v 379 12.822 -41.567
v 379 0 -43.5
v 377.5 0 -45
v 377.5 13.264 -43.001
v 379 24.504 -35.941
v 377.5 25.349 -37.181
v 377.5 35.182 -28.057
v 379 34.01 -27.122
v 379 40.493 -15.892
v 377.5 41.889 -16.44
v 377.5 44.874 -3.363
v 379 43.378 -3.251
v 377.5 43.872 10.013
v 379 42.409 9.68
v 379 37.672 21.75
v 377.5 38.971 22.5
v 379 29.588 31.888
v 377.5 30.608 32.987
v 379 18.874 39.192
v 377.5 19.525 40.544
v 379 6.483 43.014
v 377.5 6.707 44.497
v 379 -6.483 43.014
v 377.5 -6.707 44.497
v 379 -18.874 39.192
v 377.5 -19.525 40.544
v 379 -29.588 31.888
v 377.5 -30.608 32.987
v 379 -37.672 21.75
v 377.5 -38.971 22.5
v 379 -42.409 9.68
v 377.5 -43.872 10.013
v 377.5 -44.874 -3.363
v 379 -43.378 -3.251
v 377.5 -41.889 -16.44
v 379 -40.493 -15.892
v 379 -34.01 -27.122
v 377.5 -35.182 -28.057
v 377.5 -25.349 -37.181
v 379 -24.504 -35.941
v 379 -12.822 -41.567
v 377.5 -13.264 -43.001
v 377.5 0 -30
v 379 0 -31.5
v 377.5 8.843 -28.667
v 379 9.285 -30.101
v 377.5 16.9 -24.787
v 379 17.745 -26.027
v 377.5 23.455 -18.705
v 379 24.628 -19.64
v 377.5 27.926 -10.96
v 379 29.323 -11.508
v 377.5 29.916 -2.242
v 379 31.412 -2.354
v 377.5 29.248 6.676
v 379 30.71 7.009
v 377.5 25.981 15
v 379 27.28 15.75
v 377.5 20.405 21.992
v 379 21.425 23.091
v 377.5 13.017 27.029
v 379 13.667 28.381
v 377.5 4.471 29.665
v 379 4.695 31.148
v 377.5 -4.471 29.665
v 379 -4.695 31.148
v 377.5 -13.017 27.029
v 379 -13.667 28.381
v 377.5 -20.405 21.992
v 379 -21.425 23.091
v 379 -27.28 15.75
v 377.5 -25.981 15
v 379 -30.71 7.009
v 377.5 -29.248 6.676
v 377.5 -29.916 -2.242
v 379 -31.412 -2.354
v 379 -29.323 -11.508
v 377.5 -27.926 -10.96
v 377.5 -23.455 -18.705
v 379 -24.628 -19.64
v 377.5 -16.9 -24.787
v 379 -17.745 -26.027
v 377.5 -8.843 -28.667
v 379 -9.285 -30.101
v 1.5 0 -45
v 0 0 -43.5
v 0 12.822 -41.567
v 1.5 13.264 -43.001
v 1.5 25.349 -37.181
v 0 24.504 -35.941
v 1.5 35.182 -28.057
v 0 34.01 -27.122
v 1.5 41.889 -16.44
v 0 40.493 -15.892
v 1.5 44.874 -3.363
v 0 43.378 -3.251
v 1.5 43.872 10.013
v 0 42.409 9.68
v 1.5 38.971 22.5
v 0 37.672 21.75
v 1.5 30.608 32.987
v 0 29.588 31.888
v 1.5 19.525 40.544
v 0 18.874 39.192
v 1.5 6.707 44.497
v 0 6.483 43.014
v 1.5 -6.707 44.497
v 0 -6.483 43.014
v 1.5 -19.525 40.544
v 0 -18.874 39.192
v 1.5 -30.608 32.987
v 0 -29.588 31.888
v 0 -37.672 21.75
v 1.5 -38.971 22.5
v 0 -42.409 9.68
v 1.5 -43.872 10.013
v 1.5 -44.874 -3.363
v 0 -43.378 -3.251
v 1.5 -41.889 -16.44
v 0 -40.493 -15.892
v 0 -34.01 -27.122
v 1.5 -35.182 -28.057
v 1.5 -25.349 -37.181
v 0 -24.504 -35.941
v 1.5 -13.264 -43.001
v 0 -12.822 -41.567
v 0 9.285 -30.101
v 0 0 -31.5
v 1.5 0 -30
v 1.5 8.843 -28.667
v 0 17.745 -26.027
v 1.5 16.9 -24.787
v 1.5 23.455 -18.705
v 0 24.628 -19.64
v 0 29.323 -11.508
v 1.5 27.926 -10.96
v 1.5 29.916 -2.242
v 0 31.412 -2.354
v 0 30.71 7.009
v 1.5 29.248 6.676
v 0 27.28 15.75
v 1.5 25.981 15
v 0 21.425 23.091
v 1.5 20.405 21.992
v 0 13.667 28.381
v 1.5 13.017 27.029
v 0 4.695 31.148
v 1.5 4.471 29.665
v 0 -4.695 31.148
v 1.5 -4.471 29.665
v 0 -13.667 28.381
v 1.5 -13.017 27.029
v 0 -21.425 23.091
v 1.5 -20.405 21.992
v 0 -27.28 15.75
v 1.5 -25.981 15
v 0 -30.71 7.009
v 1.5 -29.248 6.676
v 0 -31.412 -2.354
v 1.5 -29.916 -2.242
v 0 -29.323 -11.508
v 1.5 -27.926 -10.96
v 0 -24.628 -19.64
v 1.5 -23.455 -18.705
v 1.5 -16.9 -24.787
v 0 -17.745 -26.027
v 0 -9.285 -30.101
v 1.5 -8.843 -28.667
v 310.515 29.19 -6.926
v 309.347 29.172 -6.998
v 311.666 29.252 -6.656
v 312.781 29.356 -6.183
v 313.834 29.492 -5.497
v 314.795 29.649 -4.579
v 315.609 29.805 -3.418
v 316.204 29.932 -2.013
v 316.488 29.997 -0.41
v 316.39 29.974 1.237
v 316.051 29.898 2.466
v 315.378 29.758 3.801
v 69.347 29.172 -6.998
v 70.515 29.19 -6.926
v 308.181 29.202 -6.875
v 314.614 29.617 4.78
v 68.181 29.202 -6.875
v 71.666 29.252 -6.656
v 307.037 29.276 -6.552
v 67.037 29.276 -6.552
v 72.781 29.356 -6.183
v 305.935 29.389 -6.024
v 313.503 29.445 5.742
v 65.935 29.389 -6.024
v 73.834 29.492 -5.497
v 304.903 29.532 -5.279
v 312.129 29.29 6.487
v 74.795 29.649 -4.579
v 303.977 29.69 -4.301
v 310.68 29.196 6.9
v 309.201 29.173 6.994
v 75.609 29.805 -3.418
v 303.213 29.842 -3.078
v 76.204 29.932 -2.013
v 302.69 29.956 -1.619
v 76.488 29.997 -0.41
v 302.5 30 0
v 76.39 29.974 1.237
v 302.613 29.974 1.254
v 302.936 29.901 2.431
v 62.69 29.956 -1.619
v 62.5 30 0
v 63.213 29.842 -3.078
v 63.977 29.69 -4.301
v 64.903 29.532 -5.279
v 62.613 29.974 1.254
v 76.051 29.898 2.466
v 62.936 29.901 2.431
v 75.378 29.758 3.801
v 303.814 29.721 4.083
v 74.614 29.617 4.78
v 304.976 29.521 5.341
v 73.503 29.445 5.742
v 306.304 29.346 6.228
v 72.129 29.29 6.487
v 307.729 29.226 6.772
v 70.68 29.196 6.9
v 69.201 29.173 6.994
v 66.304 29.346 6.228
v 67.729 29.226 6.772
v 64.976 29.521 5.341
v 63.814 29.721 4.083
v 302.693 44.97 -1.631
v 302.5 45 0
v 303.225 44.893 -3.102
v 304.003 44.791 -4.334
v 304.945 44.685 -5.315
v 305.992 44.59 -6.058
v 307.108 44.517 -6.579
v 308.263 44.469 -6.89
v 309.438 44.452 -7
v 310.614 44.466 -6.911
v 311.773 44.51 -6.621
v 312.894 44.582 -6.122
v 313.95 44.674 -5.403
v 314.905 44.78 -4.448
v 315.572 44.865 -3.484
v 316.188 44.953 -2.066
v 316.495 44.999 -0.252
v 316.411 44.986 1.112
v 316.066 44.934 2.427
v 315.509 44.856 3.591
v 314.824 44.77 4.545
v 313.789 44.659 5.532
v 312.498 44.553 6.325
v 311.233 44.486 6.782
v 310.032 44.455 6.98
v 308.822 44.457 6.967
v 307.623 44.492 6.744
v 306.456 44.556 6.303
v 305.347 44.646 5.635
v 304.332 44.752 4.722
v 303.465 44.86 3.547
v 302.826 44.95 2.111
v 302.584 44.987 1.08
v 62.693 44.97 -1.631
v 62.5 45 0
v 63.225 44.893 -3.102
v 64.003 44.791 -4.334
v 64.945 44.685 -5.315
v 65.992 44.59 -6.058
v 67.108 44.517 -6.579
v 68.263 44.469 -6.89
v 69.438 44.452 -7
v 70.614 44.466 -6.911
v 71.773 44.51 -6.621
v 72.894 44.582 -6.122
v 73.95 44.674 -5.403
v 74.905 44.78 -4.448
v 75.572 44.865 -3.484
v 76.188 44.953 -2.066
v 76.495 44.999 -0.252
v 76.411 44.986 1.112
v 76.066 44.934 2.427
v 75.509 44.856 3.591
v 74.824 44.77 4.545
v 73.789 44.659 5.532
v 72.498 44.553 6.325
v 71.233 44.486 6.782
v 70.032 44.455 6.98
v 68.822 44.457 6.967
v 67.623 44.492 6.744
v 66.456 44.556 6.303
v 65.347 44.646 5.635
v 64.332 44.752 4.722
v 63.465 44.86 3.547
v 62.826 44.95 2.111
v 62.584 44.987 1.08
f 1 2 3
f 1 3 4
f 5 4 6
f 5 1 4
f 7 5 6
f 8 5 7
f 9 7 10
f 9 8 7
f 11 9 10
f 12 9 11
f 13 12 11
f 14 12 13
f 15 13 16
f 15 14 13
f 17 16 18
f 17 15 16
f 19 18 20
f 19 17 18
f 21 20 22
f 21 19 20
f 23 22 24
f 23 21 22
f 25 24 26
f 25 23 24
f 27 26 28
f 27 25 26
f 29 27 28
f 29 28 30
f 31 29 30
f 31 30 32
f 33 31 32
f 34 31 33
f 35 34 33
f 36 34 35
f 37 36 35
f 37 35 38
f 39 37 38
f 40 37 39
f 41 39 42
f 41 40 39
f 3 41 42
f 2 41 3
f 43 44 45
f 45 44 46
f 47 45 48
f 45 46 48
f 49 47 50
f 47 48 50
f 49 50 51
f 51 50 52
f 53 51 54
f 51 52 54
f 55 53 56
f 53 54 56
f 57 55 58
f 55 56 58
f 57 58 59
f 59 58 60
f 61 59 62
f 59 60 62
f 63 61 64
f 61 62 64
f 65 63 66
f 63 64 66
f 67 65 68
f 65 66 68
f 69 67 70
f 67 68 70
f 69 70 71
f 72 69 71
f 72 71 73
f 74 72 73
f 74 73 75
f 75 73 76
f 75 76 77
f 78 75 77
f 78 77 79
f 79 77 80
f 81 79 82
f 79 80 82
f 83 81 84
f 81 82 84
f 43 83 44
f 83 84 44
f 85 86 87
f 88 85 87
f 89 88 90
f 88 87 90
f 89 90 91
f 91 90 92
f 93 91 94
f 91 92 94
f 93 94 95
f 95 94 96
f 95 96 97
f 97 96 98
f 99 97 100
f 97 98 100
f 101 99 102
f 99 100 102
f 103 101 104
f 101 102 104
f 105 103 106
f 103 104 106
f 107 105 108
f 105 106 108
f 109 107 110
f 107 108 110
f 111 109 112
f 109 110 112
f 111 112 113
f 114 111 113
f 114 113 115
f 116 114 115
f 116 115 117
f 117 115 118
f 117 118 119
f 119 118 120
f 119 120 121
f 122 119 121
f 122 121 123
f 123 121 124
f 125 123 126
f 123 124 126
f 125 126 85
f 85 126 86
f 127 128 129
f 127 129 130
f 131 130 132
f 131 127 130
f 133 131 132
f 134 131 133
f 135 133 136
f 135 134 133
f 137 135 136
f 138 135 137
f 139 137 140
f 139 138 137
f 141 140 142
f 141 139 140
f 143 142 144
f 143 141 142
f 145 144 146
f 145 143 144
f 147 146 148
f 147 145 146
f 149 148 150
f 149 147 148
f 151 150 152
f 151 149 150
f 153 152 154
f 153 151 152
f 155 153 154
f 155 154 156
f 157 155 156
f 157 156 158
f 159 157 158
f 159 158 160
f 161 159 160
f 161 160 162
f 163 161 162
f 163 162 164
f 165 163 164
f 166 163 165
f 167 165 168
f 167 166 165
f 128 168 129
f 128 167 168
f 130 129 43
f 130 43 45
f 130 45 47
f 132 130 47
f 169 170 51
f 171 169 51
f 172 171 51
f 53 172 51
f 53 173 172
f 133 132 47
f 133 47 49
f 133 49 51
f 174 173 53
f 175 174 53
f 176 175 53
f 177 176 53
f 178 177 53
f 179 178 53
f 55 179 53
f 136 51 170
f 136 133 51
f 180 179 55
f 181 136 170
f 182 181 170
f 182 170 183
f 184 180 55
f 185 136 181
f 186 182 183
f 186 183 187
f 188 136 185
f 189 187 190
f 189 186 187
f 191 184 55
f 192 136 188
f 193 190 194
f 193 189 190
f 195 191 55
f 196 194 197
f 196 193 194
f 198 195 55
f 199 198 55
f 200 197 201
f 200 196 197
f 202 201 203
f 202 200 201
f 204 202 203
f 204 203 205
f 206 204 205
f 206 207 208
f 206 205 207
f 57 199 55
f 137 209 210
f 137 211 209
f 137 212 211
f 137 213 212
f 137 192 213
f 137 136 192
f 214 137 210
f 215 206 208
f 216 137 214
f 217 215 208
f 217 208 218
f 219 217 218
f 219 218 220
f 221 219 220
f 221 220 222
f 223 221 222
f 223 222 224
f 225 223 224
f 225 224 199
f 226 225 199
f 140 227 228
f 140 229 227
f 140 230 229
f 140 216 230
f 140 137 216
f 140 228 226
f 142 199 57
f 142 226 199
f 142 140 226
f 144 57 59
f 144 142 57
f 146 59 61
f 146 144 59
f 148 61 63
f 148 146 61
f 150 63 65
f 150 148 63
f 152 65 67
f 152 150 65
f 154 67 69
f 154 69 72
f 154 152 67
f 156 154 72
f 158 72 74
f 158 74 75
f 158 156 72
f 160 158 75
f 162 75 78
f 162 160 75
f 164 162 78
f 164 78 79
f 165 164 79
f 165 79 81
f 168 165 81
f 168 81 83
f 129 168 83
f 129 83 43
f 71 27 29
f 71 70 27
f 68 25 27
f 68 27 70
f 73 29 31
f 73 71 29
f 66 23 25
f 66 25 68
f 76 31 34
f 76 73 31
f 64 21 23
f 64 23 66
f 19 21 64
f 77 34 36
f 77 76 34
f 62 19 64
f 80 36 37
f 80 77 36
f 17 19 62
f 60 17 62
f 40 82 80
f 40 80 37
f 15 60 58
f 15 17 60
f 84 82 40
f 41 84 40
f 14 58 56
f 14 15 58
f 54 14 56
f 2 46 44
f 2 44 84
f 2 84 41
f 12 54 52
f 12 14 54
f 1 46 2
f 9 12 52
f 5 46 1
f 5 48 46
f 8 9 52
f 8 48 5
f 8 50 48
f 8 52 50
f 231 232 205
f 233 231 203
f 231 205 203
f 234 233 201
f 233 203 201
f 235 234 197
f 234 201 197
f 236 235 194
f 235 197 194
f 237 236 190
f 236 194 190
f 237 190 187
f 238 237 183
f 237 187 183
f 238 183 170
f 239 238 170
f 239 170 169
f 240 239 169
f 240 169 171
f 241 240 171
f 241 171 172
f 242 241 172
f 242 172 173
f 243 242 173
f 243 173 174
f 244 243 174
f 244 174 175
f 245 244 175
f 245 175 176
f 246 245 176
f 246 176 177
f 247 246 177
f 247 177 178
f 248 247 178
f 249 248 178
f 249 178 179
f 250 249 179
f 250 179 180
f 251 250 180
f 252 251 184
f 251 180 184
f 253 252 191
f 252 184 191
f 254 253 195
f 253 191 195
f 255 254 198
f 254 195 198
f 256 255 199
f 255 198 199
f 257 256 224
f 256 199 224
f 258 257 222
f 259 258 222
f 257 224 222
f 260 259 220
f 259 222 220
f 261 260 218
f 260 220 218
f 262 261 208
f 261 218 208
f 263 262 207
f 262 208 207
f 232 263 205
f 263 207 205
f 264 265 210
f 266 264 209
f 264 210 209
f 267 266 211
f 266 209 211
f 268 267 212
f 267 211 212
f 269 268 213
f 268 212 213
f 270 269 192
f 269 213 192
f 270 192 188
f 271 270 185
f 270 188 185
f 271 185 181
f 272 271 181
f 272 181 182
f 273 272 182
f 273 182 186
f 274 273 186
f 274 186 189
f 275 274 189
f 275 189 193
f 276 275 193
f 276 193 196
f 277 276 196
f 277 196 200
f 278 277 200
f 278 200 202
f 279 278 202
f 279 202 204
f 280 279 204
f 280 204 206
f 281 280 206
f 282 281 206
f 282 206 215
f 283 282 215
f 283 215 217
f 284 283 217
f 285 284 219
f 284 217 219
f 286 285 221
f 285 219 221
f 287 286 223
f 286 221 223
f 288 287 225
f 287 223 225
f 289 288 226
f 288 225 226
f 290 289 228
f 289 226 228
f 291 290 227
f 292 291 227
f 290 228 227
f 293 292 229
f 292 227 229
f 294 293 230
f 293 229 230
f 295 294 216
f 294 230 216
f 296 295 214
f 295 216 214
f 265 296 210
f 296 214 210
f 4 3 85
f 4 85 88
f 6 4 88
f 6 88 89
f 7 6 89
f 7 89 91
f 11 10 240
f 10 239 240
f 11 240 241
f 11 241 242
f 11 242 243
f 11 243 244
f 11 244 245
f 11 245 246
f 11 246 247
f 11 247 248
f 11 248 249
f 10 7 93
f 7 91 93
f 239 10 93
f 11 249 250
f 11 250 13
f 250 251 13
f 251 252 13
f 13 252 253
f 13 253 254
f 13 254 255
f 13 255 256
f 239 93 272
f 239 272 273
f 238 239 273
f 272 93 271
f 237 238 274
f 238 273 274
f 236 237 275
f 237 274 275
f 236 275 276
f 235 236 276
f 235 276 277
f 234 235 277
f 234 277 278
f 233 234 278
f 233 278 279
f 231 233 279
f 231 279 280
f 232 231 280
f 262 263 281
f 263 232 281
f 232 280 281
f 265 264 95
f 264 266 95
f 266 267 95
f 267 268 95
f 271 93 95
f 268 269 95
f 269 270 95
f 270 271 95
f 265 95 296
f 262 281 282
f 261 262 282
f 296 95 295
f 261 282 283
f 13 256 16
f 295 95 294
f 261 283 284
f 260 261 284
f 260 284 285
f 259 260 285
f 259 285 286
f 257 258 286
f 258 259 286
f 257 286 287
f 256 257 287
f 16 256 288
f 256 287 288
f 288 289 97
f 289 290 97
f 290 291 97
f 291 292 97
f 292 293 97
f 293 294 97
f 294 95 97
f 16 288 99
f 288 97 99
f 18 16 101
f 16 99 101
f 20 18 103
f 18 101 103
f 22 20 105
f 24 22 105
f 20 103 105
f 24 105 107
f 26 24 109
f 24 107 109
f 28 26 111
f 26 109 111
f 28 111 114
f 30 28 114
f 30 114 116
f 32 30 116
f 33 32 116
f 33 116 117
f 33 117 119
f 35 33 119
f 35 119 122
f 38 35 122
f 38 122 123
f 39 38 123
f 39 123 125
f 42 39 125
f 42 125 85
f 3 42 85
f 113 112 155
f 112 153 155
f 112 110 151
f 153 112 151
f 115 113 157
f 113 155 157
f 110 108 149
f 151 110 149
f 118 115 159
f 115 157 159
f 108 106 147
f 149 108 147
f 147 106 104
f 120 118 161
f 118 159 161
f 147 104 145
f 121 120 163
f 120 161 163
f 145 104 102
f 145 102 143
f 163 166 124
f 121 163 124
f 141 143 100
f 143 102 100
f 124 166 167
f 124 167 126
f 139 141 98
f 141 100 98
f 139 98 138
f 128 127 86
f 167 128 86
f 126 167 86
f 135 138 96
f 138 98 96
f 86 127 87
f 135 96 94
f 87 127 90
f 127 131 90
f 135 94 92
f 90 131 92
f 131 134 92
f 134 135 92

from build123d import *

# Parameters (mm, degrees)
SKETCH_1_R              = 45
SKETCH_1_R_2            = 30
EXTRUDE_1_DEPTH         = 379
CHAMFER_1_SIZE          = 1.5
HOLE_WIZARD_M16_2_D     = 14
HOLE_WIZARD_M16_2_DEPTH = 42
HOLE_WIZARD_M16_2_TIP   = 4.206024333


with BuildPart() as part:
    # 草图1 → 凸台-拉伸1 (new body)
    with BuildSketch(Plane(origin=(0, 0, 0), x_dir=(0, 0, -1), z_dir=(1, 0, 0))):
        Circle(SKETCH_1_R)
        Circle(SKETCH_1_R_2, mode=Mode.SUBTRACT)
    extrude(amount=EXTRUDE_1_DEPTH)

    # 倒角1
    chamfer_1_edges = [part.edges().sort_by_distance(p)[0] for p in [
        (0, 0, 45),
        (379, 0, 45),
        (0, 0, 30),
        (379, 0, 30),
    ]]
    chamfer(chamfer_1_edges, length=CHAMFER_1_SIZE)

    # M16 螺纹孔2
    with Locations(Plane(origin=(0, 45, 0), x_dir=(1, 0, 0), z_dir=(0, 1, 0))):
        with Locations((69.5, 0), (309.5, 0)):
            Hole(HOLE_WIZARD_M16_2_D / 2, depth=HOLE_WIZARD_M16_2_DEPTH)
            with Locations((0, 0, -(HOLE_WIZARD_M16_2_DEPTH + HOLE_WIZARD_M16_2_TIP / 2))):  # 118° drill point
                Cone(0, HOLE_WIZARD_M16_2_D / 2, HOLE_WIZARD_M16_2_TIP, mode=Mode.SUBTRACT)


solid = part.part
